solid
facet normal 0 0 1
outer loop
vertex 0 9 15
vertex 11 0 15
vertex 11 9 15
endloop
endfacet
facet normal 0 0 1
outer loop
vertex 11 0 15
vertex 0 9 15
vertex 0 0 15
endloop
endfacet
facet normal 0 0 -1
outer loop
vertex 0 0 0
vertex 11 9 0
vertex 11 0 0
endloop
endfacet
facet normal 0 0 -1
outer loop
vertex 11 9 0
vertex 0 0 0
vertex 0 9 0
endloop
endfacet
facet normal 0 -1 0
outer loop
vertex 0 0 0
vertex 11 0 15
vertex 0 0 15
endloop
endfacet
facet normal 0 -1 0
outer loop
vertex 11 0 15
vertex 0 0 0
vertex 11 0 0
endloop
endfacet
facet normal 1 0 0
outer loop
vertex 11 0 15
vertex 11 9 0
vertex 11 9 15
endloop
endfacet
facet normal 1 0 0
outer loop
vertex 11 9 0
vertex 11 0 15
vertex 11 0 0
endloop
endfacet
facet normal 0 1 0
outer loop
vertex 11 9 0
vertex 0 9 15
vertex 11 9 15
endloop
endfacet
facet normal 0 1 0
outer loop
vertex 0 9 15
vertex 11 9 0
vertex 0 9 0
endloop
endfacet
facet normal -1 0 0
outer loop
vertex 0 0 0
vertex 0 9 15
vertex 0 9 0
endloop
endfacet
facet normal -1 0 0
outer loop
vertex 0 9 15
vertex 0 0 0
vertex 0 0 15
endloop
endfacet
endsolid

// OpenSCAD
// Generated by SolidPython 1.0.1 on 2020-07-29 00:46:55


cube(size = [11, 9, 15]);
/***********************************************
*********      SolidPython code:      **********
************************************************
 
# import packages: SolidPython
from solid import *
from solid.utils import *
from itertools import chain, combinations, permutations


class Resize:

    def __init__(self, scad_file):
        self.scad_file = scad_file
        #self.scad_file = import_scad(scad_file)
        # cone/cylinder param:
        self.r1 = 0
        self.r2 = 0
        self.h = 0
        # rectangular prism param:
        self.w = 0
        self.l = 0
        # ellipse param:
        self.r = 0

    # import OpenScad code (file name corresponds to shape)


    # classify shape + parameters
    def assign(self, param1, param2, param3):
        if self.scad_file == 'cone.scad':
            self.r1 = param1
            self.r2 = param2
            self.h = param3
        elif self.scad_file == 'cylinder.scad':
            self.r1 = param1
            self.r2 = param2
            self.h = param3
        elif self.scad_file == 'rectangularPrism.scad':
            self.h = param1
            self.l = param2
            self.w = param3
        else:
            self.r = param1
            self.h = param2

    # resize parameters
    def iterate(self):
        x = range(3, 20, 2)
        i = 1
        if self.scad_file == 'cone.scad':
            tempList = list(permutations(x, 2))
            for temp in tempList:
                param1 = temp[0]
                param2 = temp[1]
                filepath = 'produced_scad_files/' + 'cone' + str(param1) + '_' + str(param2) + '_' + '.scad'
                scad_render_to_file(cylinder(h=param1, r1=param2, r2=0), filepath)

        elif self.scad_file == 'cylinder.scad':
            tempList = list(permutations(x, 3))
            for temp in tempList:
                param1 = temp[0]
                param2 = temp[1]
                filepath = 'produced_scad_files/' + 'cylinder' + str(param1) + '_' + str(param2) + '_' + '.scad'
                scad_render_to_file(cylinder(h=param1, r1=param2, r2=param2), filepath)

        elif self.scad_file == 'rectangularPrism.scad':
            tempList = list(permutations(x, 3))
            for temp in tempList:
                param1 = temp[0]
                param2 = temp[1]
                param3 = temp[2]
                filepath = 'produced_scad_files/' + 'rectangularPrism' + str(param1) + '_' + str(param2) + '_' + str(
                    param3) + '.scad'
                scad_render_to_file(cube(size=(param1, param2, param3)), filepath)

        elif self.scad_file == 'ellipse.scad':
            tempList = list(permutations(x, 4))
            for temp in tempList:
                param1 = temp[0]
                param2 = temp[1]
                param3 = temp[2]
                param4 = temp[3]
                filepath = 'produced_scad_files/' + 'ellipse' + str(param1) + '_' + str(param2) + '_' + str(param3) + '_' + str(param4) + '.scad'
                scad_render_to_file(scale([param1, param2, param3])(sphere(r=param4)), filepath)

    def render_to_scadfile(self):
        scad_render_to_file(scad, 'example.scad') 
 
************************************************/
